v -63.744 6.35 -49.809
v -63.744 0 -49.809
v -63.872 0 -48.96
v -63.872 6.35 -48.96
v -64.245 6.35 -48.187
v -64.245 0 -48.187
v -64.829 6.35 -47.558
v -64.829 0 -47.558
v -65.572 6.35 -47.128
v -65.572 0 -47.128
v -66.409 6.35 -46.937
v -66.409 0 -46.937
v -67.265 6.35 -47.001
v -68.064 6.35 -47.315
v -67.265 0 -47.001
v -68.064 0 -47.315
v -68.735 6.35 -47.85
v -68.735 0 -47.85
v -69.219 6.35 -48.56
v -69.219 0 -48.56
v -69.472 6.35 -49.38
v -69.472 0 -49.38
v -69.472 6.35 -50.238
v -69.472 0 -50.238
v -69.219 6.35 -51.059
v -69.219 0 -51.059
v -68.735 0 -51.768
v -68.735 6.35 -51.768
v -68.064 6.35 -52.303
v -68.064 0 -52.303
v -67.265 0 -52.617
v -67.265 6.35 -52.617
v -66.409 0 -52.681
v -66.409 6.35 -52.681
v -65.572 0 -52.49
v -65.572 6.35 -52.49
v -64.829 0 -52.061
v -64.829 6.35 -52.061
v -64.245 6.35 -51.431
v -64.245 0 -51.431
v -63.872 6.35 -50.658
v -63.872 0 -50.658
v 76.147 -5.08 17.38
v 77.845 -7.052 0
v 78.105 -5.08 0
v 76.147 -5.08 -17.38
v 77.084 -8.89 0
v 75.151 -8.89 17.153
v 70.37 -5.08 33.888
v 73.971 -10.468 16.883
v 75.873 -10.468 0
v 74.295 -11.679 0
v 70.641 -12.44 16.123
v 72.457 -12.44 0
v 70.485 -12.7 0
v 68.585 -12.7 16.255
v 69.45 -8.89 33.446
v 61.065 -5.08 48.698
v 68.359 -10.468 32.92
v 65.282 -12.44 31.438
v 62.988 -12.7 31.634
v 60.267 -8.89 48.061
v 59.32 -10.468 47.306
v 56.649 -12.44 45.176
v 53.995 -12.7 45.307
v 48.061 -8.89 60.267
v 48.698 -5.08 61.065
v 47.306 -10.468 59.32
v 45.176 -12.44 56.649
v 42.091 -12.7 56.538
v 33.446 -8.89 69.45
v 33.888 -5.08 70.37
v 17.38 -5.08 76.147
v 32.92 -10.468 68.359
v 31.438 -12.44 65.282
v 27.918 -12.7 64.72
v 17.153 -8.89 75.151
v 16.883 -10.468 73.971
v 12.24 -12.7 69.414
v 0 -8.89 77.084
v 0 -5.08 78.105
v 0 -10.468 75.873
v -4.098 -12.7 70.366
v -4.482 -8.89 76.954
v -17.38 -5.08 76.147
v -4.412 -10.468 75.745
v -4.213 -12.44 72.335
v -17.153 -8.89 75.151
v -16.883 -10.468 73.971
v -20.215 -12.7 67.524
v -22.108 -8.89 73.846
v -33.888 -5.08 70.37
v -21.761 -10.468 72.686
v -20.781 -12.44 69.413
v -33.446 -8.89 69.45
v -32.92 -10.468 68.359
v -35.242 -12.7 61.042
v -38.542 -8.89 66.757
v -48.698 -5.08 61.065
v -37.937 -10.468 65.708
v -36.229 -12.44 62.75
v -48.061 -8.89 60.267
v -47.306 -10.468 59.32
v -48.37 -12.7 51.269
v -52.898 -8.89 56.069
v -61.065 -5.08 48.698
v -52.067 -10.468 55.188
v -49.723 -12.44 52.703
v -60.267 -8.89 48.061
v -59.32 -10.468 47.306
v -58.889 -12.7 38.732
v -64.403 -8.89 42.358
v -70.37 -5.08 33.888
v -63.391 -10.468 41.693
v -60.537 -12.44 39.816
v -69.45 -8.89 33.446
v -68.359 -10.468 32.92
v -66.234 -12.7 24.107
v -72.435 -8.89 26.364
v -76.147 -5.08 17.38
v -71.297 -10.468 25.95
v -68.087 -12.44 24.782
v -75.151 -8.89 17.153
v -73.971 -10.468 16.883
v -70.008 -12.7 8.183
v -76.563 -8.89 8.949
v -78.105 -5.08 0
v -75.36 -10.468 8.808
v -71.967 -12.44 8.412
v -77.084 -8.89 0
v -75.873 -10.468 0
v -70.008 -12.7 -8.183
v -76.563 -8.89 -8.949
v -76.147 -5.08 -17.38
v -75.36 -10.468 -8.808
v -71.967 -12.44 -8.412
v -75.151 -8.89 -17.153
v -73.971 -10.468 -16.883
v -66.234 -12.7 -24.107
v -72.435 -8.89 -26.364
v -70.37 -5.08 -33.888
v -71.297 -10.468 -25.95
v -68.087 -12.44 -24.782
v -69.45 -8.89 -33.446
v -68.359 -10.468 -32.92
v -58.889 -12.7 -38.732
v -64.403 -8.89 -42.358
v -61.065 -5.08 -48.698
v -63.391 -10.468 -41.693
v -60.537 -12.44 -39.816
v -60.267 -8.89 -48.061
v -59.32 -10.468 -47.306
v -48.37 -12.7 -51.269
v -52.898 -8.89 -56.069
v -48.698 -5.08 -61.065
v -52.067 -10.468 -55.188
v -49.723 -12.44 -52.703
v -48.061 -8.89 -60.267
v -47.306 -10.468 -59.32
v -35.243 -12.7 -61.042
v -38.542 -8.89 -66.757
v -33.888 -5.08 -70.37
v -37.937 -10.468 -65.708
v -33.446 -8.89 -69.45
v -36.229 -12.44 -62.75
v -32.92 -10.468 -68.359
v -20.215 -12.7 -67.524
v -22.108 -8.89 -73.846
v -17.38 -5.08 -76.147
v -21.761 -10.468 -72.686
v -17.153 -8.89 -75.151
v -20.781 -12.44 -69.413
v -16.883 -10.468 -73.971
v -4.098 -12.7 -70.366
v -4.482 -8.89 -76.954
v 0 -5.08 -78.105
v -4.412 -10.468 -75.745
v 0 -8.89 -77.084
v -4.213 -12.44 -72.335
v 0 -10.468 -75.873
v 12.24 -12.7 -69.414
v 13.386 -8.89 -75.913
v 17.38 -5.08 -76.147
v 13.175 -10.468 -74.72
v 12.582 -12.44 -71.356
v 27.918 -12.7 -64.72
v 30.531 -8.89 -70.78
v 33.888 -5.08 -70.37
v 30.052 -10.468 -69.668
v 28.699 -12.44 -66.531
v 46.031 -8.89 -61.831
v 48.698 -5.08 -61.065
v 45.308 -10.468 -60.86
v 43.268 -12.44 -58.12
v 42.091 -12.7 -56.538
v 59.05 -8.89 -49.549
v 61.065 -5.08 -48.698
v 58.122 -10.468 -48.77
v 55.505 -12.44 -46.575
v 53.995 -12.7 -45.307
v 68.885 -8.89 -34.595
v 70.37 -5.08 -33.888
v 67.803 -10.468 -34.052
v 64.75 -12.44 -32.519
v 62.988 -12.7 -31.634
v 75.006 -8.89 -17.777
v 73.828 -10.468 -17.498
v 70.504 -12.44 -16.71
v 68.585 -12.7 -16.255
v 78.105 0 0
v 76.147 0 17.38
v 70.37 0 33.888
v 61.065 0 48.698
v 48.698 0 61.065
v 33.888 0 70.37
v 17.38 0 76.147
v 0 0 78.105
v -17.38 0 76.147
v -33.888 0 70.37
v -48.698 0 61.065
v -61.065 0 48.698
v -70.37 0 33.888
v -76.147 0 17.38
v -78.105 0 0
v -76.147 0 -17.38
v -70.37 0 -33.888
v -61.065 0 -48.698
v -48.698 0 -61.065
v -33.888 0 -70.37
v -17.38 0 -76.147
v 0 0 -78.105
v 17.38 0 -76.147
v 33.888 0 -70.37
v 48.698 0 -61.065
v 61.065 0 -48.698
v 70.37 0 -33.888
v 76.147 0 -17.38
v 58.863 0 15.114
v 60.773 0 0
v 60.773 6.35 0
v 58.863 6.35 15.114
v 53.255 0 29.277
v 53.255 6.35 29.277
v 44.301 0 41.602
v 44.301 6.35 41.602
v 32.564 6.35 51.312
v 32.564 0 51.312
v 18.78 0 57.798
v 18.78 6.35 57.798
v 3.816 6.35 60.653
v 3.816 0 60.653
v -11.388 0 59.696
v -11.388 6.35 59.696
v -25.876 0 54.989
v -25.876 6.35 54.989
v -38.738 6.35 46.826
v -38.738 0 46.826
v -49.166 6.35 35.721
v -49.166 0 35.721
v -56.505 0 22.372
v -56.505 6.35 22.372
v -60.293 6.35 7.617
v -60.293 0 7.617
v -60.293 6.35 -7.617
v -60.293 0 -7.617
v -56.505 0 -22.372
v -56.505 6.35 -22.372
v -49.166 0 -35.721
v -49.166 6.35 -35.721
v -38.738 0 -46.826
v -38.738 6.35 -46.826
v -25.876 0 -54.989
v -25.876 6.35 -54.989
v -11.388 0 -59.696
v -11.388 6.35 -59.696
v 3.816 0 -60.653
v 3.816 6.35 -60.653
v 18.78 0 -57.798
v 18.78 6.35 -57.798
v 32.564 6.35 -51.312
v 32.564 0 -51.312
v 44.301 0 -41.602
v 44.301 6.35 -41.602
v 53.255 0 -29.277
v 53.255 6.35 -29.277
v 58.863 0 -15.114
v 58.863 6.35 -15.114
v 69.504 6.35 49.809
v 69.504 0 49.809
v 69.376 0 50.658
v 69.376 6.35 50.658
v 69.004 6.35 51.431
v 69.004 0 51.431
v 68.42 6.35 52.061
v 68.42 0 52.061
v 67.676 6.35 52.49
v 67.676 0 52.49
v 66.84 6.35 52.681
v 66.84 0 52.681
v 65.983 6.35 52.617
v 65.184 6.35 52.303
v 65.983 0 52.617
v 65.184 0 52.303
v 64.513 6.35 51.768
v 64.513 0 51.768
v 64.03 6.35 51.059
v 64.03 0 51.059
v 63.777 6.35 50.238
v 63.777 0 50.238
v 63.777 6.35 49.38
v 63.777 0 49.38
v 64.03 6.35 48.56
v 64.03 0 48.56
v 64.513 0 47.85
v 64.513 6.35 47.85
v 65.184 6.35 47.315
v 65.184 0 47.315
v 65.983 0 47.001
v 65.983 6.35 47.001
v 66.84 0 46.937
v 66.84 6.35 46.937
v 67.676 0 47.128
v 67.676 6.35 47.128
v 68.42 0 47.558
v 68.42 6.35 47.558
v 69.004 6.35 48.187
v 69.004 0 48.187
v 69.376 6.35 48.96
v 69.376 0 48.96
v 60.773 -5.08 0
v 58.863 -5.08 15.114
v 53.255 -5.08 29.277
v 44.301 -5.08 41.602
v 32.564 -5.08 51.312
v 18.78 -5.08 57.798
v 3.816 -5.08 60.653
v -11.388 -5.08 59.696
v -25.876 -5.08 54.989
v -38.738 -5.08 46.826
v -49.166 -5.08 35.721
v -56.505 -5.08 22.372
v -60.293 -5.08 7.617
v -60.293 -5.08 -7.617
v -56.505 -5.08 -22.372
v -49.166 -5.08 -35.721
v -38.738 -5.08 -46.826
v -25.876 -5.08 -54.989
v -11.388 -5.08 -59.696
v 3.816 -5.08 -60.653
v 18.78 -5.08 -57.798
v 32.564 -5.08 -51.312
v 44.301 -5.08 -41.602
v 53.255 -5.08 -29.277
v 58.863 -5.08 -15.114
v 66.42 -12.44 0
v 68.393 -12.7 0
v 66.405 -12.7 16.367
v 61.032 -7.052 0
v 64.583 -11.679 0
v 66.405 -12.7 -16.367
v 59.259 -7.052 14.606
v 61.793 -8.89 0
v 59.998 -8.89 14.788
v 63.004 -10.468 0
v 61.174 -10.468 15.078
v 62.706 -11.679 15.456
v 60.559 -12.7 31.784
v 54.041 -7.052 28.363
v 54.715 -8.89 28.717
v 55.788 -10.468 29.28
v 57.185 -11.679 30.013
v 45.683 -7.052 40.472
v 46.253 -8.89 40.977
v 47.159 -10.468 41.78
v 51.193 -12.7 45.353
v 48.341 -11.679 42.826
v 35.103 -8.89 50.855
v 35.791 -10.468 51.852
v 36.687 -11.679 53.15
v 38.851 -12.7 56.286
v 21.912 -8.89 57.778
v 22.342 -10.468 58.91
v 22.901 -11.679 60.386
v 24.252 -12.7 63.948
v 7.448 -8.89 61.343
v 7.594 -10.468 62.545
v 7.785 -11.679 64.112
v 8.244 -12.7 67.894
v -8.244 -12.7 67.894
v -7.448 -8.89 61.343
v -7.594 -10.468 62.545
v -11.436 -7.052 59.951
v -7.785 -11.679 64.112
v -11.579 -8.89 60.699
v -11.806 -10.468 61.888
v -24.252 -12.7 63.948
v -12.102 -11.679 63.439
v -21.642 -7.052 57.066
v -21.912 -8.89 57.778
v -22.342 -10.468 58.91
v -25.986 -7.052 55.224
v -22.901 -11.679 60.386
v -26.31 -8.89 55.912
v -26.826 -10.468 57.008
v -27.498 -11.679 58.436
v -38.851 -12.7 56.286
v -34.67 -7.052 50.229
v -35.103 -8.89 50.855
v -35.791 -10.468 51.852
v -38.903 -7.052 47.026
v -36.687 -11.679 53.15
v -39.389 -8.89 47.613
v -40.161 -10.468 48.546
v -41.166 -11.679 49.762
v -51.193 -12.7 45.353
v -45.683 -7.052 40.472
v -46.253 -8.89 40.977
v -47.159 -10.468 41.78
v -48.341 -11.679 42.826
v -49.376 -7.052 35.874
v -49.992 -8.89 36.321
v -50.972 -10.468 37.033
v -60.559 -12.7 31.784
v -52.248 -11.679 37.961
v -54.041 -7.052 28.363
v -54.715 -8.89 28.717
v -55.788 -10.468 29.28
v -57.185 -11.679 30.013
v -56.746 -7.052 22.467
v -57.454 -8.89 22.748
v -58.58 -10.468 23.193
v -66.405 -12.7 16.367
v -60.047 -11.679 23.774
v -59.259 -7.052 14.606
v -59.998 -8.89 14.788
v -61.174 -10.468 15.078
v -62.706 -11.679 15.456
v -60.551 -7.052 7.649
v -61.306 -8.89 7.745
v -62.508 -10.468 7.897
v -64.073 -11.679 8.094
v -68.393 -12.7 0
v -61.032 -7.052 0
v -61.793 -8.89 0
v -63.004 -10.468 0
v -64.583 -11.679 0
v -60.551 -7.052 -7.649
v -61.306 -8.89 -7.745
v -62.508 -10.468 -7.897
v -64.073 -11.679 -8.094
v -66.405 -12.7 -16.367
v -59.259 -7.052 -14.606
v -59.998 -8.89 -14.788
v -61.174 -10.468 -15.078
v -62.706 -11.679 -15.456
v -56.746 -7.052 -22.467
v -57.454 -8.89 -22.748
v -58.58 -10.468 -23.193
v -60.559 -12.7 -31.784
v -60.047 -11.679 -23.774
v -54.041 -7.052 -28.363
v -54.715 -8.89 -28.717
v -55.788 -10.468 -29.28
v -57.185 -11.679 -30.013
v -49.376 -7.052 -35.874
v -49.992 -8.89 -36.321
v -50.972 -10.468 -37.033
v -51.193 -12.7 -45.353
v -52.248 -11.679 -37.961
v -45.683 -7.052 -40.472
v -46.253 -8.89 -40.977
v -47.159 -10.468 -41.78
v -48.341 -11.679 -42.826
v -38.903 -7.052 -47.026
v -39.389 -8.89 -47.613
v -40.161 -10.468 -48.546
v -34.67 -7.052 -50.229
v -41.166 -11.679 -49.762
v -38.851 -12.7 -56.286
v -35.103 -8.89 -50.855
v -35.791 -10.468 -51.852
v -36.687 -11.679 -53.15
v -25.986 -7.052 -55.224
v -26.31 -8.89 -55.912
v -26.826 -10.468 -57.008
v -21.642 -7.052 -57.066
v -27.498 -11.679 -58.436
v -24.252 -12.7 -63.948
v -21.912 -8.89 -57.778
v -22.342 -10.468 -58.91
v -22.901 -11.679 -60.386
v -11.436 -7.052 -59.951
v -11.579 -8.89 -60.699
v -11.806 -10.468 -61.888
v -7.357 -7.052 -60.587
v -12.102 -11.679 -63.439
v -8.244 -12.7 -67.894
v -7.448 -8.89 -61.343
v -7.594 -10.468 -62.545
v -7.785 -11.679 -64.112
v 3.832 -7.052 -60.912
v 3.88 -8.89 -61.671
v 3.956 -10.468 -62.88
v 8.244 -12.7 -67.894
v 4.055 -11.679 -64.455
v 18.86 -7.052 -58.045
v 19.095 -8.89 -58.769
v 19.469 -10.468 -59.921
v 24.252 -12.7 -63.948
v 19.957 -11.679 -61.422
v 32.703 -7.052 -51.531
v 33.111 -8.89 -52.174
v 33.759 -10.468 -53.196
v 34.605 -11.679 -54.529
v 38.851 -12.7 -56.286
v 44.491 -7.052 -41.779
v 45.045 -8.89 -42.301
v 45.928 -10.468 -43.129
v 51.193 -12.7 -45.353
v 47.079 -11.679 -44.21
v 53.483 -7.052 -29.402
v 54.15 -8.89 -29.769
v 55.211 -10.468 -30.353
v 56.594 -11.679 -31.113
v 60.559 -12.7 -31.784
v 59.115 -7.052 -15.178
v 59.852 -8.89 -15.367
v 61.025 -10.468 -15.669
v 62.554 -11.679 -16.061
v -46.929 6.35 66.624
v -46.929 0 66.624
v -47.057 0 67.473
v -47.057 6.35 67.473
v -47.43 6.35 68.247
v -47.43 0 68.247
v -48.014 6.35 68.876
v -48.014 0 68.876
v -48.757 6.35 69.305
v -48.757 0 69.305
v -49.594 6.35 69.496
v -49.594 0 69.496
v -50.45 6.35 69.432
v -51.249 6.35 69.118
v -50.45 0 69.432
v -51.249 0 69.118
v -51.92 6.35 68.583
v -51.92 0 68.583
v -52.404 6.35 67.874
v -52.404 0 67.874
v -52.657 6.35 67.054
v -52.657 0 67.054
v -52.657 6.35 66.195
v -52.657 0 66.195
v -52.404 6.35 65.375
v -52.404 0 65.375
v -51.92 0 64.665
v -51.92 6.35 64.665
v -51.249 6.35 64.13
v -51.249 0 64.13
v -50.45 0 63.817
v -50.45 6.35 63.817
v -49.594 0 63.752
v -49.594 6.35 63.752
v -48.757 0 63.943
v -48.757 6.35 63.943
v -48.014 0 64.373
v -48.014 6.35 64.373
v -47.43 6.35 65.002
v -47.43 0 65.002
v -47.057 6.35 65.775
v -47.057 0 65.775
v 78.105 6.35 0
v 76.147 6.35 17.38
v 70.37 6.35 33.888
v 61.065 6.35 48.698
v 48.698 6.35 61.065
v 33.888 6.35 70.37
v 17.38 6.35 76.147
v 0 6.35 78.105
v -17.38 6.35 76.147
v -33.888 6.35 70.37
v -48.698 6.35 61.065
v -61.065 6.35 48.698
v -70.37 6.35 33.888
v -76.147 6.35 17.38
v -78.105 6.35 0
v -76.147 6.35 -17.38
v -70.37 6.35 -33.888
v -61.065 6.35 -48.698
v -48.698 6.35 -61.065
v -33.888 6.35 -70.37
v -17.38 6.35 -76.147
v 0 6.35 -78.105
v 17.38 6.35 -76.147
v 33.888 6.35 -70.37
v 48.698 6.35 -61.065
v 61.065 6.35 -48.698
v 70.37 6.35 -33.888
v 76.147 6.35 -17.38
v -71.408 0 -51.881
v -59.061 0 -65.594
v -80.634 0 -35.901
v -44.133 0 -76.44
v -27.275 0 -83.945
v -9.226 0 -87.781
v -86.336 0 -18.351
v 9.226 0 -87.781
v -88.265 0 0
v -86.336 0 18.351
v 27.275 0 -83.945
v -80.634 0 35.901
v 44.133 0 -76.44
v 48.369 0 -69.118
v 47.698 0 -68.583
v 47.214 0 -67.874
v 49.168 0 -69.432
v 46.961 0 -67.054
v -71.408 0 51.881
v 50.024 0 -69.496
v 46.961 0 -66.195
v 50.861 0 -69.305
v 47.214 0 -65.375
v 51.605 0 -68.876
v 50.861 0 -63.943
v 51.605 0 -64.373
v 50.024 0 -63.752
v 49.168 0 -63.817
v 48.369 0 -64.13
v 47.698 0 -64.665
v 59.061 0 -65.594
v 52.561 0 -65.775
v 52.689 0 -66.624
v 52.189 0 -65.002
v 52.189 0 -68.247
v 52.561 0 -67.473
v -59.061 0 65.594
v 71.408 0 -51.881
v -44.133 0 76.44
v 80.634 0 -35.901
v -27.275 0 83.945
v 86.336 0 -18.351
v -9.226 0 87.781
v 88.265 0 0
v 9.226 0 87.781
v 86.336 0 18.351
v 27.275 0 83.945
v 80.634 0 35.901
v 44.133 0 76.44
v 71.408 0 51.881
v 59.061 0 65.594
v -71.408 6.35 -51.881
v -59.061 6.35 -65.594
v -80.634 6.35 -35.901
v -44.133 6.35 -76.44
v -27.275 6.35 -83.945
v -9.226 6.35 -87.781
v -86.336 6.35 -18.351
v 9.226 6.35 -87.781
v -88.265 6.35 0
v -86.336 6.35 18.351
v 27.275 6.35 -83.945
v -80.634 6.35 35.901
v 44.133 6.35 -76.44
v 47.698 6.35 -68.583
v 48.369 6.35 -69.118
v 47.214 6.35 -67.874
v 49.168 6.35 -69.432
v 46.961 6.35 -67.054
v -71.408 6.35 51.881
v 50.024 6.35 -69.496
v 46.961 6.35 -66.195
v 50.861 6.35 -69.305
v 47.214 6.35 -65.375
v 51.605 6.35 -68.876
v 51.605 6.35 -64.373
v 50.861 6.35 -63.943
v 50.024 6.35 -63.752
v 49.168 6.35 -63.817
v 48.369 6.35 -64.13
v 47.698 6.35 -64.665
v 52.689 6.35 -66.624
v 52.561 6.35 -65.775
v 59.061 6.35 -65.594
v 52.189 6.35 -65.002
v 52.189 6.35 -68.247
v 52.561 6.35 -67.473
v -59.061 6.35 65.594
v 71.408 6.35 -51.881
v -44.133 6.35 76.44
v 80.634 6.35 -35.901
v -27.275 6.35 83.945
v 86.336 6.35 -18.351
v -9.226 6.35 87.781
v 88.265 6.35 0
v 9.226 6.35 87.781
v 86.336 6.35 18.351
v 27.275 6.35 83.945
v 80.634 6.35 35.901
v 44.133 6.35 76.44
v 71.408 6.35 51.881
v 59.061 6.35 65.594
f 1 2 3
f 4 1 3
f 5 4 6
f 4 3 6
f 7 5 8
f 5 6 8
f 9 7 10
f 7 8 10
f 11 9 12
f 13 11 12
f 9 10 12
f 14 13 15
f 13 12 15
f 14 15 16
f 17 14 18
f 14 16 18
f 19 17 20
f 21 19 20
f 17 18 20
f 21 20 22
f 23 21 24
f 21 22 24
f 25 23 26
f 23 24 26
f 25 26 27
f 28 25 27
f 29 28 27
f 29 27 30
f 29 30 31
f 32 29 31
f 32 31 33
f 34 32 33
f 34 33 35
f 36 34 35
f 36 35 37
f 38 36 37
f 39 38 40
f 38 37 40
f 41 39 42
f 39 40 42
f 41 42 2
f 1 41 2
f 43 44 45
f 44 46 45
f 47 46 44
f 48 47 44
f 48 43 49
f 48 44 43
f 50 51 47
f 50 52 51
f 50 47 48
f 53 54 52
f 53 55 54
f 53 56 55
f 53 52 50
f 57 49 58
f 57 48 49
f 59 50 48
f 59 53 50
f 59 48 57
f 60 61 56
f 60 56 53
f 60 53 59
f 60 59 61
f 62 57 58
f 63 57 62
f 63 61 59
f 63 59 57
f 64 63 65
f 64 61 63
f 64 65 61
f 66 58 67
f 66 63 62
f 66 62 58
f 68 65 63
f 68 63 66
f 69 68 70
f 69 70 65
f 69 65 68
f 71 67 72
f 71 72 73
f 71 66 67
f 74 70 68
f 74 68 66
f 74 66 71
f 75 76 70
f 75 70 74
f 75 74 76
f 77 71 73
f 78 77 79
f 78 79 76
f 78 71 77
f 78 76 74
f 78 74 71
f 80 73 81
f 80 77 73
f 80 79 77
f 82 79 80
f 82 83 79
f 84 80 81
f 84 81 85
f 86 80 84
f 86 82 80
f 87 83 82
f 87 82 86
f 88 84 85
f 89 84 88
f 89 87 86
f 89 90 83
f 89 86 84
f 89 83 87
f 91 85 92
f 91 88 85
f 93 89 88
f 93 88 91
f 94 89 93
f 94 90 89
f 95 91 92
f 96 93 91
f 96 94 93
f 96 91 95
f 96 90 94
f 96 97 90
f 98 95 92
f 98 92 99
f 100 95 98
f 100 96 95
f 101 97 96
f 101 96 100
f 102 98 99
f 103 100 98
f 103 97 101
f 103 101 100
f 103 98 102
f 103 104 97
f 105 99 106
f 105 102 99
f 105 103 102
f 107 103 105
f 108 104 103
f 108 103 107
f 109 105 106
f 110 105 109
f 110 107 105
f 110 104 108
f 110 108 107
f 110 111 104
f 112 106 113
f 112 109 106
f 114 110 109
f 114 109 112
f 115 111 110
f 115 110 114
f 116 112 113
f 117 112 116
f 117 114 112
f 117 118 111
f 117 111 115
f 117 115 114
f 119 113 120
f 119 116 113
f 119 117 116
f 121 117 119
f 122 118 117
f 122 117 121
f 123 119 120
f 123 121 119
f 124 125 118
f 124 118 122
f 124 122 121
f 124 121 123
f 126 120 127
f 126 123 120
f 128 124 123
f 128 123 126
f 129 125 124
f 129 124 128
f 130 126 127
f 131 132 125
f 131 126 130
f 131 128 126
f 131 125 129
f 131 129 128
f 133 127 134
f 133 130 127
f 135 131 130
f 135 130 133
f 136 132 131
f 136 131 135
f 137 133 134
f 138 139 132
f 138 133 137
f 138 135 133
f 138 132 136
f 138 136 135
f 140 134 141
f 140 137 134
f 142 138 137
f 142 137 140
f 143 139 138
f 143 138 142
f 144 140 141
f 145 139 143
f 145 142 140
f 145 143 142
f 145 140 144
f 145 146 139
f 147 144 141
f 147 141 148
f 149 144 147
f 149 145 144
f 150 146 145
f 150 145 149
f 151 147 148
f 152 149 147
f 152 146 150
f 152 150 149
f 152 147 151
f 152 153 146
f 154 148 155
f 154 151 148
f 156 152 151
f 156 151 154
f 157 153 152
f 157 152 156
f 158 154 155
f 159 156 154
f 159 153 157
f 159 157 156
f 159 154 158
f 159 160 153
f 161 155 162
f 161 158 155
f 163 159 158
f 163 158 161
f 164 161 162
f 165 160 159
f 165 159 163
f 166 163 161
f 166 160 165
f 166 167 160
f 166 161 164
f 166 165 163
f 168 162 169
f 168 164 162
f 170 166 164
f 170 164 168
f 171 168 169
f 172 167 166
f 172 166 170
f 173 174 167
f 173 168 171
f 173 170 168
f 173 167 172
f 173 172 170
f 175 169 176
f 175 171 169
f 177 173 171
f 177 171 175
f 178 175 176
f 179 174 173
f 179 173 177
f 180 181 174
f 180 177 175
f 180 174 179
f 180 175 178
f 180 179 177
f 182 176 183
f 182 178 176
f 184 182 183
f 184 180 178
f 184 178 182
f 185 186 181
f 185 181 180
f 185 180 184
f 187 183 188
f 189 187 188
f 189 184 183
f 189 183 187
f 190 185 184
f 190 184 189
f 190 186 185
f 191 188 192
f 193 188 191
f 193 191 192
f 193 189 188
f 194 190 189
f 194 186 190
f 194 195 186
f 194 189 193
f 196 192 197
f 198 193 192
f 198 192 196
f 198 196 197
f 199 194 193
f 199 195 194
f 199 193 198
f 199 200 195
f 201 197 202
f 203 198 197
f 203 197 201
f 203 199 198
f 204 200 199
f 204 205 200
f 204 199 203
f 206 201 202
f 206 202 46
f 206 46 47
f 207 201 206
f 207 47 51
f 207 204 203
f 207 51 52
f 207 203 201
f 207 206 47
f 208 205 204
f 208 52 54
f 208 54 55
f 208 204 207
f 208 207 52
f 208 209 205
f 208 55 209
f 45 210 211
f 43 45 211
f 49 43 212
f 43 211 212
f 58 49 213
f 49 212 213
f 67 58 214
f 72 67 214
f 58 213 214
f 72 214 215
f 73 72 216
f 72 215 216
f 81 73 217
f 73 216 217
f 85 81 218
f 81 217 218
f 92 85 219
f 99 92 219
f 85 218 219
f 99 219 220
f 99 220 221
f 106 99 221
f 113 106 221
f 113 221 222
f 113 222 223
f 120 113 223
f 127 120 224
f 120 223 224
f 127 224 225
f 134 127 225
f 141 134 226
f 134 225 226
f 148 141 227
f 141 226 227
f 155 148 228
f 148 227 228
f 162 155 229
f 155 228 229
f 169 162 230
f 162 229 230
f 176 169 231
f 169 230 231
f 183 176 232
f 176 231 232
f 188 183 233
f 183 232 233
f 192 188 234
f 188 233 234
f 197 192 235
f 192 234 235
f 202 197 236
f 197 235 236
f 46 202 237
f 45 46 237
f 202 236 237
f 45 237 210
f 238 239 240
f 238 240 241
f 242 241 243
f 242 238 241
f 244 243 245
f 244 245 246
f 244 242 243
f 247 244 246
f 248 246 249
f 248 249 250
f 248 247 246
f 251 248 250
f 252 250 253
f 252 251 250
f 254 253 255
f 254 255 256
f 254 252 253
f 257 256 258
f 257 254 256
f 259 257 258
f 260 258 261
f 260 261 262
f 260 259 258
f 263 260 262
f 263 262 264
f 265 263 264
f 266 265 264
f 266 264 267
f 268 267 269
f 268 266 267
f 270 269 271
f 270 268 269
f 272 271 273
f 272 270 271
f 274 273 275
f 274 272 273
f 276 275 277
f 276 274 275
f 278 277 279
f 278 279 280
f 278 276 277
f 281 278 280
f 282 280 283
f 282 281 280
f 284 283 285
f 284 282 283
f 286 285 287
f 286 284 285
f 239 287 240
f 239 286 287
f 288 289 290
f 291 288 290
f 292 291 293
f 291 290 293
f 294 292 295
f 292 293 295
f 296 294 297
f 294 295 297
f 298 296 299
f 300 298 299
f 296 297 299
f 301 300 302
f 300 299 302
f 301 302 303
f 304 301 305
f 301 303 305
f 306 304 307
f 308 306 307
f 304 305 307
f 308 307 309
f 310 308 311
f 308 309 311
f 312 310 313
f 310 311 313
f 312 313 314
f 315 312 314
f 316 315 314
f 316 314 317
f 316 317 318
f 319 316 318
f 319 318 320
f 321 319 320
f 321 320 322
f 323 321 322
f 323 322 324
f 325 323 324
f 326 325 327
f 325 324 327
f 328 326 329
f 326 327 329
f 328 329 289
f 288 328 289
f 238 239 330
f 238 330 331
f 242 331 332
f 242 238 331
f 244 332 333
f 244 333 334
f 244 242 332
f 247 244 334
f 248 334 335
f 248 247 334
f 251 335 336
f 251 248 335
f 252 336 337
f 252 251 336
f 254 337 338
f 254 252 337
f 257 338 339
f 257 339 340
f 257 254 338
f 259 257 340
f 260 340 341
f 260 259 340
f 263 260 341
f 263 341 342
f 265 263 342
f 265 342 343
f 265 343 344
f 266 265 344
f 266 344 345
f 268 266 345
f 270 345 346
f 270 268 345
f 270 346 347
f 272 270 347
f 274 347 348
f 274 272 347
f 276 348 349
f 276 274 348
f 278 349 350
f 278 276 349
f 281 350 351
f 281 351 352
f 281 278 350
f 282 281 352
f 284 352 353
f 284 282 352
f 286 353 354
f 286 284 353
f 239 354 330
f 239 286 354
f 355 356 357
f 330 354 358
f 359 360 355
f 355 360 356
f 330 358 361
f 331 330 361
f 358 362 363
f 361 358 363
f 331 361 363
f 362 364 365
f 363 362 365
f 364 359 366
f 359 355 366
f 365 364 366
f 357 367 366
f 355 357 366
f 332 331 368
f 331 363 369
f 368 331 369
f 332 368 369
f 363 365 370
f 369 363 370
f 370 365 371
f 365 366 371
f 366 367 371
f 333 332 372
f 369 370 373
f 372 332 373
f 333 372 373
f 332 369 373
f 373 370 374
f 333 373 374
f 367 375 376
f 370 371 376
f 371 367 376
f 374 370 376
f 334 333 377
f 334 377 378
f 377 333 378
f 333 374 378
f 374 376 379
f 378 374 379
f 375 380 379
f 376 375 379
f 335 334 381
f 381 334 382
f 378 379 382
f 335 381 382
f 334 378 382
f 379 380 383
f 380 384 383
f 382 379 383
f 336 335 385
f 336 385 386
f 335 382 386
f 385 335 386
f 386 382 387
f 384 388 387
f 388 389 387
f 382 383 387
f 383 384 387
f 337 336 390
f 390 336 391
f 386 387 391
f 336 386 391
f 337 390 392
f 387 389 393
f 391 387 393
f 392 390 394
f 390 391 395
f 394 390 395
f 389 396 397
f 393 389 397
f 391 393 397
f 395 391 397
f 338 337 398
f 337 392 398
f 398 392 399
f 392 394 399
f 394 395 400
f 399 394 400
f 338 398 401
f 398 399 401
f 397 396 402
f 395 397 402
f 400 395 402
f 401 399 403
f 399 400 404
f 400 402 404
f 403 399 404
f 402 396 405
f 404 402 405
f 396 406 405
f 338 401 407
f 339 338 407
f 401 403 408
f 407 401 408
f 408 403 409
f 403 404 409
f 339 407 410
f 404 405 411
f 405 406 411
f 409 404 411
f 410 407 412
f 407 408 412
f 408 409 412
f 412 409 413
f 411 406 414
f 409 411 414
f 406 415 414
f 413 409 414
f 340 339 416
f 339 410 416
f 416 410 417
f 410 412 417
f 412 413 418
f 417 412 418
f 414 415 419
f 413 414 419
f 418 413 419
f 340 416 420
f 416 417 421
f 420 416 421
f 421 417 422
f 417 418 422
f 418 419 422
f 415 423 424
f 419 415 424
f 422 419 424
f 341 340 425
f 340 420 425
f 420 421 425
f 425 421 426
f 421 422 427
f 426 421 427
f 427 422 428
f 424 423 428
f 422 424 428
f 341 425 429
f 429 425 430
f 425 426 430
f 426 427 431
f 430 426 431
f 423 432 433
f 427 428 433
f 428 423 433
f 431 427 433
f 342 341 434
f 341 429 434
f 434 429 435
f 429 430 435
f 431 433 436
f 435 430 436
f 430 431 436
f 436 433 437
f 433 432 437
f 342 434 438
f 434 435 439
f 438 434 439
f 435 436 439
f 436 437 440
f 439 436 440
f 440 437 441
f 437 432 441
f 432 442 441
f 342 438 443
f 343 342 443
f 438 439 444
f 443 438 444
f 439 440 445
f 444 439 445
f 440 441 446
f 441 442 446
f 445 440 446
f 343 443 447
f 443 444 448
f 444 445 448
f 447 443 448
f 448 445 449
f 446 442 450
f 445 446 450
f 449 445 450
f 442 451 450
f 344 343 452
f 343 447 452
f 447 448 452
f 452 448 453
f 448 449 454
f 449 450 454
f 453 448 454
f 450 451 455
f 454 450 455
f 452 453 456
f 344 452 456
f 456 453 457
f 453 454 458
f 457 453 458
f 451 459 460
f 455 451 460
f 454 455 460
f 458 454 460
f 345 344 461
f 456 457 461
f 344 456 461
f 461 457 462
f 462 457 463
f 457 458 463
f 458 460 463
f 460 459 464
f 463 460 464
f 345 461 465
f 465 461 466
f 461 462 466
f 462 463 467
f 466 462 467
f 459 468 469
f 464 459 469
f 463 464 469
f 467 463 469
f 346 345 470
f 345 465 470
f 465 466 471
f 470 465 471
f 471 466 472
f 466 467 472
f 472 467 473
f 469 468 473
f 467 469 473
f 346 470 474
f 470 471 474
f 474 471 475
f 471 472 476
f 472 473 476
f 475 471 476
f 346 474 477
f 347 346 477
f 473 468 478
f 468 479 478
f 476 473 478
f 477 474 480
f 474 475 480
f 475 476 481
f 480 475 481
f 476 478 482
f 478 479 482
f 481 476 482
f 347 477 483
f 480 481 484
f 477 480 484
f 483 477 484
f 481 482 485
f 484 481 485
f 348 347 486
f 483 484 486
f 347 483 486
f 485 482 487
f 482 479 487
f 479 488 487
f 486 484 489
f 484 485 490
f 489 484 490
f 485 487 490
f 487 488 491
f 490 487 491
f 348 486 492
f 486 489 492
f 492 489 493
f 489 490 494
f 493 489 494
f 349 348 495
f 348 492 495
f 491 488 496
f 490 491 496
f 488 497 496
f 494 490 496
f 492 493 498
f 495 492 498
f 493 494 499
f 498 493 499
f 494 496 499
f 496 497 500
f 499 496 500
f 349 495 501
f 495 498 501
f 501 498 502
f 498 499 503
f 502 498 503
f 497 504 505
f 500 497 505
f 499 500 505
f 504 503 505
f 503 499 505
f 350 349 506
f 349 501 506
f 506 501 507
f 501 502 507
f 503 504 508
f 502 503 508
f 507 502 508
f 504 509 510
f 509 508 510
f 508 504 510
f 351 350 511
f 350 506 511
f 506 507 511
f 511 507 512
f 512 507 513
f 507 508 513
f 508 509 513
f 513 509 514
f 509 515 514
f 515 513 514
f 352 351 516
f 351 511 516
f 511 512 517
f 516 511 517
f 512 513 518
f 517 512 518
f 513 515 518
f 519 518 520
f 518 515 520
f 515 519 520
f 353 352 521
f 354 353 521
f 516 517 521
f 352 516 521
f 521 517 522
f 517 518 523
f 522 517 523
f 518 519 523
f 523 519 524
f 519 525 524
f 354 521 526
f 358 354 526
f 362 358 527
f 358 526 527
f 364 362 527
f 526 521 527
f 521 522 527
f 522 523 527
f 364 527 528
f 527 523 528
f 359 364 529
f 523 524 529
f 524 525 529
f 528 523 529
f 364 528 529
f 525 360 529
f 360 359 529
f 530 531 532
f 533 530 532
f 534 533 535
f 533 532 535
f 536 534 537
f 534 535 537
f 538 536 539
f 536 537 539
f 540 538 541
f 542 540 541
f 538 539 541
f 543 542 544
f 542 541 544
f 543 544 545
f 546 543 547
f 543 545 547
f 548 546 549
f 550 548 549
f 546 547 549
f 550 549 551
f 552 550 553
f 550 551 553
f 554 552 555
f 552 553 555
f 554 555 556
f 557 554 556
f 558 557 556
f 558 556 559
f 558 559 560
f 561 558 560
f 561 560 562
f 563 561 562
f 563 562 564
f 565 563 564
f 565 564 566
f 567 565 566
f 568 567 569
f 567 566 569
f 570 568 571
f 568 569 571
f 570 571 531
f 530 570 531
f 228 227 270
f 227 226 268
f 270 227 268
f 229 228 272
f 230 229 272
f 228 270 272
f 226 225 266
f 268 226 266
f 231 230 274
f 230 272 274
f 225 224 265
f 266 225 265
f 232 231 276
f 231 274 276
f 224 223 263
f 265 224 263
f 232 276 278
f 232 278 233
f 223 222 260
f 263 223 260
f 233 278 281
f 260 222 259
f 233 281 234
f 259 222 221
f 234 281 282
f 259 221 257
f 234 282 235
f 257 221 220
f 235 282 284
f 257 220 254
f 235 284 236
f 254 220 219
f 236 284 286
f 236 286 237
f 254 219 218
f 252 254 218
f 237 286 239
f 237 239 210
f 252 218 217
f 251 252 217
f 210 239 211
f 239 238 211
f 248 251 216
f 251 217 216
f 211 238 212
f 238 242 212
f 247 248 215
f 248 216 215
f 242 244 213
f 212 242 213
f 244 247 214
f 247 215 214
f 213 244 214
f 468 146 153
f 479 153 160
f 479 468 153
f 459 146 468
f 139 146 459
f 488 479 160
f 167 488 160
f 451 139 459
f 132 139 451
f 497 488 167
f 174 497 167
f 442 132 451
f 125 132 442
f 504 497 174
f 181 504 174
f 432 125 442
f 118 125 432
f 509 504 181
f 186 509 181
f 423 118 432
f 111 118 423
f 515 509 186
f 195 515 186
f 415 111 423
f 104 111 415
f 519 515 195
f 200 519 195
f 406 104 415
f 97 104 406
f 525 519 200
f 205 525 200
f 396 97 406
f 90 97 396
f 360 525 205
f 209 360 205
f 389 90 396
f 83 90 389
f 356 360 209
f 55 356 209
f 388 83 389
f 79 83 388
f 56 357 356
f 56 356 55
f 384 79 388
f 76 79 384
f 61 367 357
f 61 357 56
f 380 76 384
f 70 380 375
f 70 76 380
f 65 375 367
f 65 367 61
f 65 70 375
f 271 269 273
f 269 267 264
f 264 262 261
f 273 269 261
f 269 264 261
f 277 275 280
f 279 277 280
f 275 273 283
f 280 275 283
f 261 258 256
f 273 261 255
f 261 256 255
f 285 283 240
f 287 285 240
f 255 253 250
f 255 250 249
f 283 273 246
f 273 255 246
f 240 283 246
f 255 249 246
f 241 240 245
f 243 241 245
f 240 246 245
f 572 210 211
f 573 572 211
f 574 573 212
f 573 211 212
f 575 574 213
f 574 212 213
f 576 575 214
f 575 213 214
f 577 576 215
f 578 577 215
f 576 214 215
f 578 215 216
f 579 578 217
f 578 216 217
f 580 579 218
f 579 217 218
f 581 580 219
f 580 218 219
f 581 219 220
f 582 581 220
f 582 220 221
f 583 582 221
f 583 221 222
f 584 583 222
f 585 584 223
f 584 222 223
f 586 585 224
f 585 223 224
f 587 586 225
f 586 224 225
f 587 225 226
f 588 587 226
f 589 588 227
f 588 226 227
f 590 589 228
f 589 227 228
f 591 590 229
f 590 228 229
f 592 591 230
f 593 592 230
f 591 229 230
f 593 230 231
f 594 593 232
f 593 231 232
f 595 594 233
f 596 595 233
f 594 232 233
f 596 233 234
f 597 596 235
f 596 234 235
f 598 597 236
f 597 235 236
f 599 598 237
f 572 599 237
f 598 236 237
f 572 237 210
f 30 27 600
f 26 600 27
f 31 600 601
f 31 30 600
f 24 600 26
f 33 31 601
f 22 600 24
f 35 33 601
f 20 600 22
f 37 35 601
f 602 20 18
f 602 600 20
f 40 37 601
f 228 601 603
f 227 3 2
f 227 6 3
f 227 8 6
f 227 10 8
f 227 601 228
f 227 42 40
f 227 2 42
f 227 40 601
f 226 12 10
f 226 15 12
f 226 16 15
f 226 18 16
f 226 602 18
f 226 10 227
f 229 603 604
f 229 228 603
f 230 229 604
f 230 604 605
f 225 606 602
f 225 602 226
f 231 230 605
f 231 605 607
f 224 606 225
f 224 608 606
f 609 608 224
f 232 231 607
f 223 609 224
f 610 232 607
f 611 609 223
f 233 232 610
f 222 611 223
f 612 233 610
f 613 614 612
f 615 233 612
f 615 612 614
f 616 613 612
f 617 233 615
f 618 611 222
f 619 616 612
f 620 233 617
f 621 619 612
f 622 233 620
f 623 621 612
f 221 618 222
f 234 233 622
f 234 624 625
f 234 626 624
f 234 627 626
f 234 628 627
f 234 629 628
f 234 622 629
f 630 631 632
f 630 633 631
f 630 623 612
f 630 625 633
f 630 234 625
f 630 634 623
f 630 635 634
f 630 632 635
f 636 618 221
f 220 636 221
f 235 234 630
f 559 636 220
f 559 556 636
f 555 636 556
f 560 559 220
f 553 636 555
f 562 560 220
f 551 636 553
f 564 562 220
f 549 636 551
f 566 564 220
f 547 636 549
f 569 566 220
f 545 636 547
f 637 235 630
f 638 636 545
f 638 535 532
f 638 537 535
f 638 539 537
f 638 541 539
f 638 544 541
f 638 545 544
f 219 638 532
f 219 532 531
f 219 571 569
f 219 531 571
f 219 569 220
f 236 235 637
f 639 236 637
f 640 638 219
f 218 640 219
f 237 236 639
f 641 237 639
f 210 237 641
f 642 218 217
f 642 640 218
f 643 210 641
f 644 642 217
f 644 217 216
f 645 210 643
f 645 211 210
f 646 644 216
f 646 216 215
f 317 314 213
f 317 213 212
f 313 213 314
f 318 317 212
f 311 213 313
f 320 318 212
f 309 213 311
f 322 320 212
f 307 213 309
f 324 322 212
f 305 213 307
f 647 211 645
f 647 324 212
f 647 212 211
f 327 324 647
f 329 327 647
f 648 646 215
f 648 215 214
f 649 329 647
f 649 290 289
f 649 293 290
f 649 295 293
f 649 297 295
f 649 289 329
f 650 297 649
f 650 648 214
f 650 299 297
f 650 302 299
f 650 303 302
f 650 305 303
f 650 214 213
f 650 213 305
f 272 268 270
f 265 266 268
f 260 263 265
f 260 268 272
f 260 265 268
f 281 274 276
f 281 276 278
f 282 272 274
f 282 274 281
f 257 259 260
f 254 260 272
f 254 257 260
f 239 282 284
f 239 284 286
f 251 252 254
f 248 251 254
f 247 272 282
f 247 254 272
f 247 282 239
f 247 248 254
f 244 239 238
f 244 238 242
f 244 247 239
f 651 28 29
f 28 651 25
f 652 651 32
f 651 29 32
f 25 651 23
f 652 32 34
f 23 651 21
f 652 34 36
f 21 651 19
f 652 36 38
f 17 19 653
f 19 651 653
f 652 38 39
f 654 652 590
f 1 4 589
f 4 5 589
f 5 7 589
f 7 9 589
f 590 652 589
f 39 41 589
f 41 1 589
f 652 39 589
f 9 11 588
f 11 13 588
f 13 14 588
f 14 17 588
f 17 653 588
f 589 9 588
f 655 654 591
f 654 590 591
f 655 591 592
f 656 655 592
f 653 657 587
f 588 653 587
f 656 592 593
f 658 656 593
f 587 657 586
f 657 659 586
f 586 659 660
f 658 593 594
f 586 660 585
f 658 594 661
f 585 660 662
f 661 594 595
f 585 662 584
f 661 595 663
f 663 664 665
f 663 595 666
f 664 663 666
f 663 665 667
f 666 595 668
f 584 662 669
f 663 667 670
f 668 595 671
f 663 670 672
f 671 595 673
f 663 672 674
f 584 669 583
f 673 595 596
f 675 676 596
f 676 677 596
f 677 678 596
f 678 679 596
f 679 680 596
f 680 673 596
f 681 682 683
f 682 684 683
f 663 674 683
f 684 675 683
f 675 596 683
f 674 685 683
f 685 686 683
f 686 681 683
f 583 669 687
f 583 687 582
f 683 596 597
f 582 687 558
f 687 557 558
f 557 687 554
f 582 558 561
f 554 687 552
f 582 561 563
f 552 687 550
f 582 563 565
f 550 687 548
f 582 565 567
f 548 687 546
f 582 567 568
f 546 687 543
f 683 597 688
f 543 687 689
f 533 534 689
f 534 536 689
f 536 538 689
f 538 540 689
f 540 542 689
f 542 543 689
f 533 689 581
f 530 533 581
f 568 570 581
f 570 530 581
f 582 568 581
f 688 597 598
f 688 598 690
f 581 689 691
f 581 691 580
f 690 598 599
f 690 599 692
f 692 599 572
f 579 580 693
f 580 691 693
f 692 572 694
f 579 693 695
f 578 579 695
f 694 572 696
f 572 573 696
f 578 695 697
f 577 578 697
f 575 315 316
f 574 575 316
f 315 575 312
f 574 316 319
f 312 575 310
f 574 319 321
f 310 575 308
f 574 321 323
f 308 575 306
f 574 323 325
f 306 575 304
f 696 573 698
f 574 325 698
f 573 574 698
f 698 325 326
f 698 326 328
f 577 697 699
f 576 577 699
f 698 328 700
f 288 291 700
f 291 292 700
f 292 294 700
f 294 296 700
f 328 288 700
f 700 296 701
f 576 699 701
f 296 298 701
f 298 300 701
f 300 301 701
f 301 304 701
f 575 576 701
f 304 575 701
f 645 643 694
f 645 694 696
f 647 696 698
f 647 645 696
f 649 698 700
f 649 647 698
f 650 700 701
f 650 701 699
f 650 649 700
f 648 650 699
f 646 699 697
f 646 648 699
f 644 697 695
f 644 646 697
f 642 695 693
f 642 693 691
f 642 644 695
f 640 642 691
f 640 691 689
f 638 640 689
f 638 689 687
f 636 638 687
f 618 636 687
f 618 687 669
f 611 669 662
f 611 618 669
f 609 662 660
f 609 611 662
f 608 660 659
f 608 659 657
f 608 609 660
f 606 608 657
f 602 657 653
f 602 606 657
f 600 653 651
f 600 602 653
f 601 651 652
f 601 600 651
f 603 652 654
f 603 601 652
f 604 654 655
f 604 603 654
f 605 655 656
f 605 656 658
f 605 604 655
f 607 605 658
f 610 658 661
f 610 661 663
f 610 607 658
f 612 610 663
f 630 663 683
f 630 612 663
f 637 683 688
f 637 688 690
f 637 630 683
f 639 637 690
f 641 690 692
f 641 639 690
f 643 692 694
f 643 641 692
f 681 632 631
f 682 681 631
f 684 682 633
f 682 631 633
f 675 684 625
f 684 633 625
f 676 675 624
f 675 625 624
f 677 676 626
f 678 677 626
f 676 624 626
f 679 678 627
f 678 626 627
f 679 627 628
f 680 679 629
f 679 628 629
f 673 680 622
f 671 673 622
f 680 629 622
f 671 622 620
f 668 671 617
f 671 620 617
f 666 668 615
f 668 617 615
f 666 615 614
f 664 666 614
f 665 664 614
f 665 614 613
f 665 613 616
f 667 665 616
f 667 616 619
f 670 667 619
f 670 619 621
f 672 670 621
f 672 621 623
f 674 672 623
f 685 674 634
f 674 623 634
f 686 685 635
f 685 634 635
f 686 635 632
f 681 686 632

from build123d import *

# Parameters (mm, degrees)
F0_R     = 78.105
F0_R_2   = 60.772539
F1_DEPTH = 12.7
F0_R_3   = 88.265
F0_R_4   = 2.879872
F2_DEPTH = 6.35
F3_R     = 7.62
F4_DEPTH = 6.35


with BuildPart() as f1:
    # F0 (on Front) → F1 (new body)
    with BuildSketch(Plane.XZ):
        Circle(F0_R)
        Circle(F0_R_2, mode=Mode.SUBTRACT)
    extrude(amount=F1_DEPTH)

    # F3
    f3_edges = [f1.edges().sort_by_distance(p)[0] for p in [
        (-78.105, -12.7, 0),
        (-60.772539, -12.7, 0),
    ]]
    fillet(f3_edges, radius=F3_R)


with BuildPart() as f2:
    # F0 (on Front) → F2 (new body)
    with BuildSketch(Plane.XZ):
        Circle(F0_R_3)
        with Locations((-66.624288, -49.80912)):
            Circle(F0_R_4, mode=Mode.SUBTRACT)
        with Locations((49.80912, -66.624288)):
            Circle(F0_R_4, mode=Mode.SUBTRACT)
        with Locations((-49.80912, 66.624288)):
            Circle(F0_R_4, mode=Mode.SUBTRACT)
        Circle(F0_R, mode=Mode.SUBTRACT)
        with Locations((66.624288, 49.80912)):
            Circle(F0_R_4, mode=Mode.SUBTRACT)
    extrude(amount=-F2_DEPTH)


with BuildPart() as f4:
    # F0 (on Front) → F4 (new body)
    with BuildSketch(Plane.XZ):
        Circle(F0_R_2)
    extrude(amount=-F4_DEPTH)


solid = Compound([f1.part, f2.part, f4.part])
